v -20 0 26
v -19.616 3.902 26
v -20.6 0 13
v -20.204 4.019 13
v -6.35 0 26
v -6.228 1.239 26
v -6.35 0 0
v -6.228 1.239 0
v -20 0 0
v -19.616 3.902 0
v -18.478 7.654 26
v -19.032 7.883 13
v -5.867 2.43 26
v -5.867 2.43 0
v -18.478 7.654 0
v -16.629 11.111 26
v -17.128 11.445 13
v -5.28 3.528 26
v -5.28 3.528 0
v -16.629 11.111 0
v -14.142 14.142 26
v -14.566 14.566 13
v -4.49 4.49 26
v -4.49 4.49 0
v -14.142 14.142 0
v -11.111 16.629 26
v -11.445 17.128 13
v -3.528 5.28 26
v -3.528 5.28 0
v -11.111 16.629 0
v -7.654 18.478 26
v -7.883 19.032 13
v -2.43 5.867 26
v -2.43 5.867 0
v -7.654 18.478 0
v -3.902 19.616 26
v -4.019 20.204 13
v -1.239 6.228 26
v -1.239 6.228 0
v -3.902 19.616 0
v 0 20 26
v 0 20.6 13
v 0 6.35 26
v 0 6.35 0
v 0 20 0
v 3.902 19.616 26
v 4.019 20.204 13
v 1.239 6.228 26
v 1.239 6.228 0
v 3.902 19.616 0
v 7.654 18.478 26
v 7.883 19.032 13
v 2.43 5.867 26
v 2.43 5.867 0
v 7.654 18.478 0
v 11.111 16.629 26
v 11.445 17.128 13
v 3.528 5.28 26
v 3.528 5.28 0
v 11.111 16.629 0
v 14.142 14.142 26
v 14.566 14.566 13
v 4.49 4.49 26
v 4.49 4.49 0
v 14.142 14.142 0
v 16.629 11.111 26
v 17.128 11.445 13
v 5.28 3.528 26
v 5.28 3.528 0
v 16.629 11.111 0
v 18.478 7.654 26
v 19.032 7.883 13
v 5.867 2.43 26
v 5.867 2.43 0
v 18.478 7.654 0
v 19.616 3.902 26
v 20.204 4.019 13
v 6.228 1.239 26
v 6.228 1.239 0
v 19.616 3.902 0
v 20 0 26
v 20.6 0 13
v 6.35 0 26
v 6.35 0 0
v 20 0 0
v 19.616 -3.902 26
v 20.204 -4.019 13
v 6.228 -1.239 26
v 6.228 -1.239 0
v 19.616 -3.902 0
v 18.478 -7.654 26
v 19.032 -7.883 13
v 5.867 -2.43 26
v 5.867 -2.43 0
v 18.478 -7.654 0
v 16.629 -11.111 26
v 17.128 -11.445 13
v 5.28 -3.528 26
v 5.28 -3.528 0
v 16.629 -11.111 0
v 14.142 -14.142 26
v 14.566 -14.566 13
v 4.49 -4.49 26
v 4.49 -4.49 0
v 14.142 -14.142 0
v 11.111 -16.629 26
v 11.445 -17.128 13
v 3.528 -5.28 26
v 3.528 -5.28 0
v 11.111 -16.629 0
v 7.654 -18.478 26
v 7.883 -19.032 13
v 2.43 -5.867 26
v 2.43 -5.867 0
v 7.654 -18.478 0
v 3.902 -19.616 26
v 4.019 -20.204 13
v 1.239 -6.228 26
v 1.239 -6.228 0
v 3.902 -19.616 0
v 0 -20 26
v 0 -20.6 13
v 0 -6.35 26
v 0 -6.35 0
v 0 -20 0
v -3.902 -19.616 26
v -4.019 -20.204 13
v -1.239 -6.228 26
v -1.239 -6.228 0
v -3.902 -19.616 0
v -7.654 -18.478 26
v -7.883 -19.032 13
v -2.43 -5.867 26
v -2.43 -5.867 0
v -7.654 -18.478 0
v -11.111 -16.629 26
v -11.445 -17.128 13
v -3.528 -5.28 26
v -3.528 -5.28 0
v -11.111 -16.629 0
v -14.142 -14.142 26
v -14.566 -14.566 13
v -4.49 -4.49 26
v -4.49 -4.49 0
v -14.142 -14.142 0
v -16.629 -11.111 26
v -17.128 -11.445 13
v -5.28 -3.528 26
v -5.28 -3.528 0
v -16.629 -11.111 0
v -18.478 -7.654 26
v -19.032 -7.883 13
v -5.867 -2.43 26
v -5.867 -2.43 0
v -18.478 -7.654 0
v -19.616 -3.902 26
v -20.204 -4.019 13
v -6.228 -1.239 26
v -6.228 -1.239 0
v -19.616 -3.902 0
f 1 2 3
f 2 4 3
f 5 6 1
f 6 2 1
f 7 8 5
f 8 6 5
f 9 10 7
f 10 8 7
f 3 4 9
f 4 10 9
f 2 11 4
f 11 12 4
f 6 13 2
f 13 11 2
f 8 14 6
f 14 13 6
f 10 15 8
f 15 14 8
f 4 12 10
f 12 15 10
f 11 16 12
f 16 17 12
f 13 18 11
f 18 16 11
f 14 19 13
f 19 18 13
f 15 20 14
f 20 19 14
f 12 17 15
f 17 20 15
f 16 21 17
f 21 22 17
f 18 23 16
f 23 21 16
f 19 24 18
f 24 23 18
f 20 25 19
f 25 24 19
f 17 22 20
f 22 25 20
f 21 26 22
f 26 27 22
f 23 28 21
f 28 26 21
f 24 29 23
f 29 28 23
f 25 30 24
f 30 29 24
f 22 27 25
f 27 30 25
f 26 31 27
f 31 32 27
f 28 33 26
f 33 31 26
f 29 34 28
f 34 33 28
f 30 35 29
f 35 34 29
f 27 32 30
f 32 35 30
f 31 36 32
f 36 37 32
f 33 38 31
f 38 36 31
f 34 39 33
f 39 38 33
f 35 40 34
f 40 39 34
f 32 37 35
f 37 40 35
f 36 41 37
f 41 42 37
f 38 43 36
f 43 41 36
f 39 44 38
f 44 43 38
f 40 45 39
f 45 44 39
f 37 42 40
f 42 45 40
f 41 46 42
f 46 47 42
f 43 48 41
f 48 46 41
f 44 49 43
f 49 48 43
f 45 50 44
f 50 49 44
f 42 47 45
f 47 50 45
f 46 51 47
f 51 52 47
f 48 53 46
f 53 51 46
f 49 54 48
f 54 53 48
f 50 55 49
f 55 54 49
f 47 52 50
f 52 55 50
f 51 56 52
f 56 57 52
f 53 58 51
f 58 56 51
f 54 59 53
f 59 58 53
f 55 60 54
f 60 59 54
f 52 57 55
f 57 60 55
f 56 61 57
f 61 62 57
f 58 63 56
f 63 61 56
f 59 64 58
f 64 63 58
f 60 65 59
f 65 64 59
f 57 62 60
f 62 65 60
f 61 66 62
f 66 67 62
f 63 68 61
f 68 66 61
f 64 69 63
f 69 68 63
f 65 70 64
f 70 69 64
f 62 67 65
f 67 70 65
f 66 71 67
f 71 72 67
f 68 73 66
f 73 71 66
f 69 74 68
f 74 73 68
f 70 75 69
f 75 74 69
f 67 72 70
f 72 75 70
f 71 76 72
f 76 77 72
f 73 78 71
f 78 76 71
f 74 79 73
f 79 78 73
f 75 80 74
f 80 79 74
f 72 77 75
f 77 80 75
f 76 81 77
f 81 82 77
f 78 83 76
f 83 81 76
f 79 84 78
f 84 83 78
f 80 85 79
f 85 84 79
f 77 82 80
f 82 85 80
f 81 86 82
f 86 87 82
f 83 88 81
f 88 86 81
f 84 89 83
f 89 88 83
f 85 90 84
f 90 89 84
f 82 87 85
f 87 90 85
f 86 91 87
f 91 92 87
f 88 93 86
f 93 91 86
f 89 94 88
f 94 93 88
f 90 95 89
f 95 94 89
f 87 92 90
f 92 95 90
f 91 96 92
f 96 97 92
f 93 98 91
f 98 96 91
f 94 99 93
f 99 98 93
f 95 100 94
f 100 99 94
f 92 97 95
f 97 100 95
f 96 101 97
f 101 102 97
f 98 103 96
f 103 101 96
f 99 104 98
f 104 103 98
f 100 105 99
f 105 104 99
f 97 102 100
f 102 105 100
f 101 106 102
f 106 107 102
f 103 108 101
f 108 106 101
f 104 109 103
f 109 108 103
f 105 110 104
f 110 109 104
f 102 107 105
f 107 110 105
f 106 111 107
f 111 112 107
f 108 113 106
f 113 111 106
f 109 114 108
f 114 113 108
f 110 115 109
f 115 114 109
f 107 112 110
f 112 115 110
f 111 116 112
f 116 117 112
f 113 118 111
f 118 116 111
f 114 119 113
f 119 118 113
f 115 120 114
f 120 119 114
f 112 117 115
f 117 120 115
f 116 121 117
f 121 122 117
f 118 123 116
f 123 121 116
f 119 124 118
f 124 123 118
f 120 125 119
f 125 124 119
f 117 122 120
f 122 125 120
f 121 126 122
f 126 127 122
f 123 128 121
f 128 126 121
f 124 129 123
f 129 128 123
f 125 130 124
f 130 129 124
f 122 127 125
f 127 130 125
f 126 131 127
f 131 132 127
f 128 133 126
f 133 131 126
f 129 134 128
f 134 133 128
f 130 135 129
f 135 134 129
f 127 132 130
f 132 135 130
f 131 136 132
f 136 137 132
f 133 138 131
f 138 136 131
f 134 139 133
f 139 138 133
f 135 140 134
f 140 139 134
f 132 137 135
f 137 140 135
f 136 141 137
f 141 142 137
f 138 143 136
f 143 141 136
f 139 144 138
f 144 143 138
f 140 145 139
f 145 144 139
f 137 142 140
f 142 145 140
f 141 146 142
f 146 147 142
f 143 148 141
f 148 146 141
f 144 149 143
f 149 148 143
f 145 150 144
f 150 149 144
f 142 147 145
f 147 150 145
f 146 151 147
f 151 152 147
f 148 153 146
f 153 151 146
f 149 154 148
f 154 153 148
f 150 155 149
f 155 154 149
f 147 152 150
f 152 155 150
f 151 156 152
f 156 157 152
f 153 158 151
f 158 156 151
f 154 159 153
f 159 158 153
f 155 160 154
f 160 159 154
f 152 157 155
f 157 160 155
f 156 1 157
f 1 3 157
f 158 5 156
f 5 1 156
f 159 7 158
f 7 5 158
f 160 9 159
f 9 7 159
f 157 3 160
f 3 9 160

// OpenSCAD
$fn = 32;

// ----------------------------------------------------------------------
// Belt roller: 40 mm barrel, 26 mm wide, bore 12.7 mm
// ----------------------------------------------------------------------

// --- parameters (mm) ---
bore_d = 12.7;            // bore
barrel_d = 40;            // barrel diameter
roller_w = 26;            // roller width
crown = 0.6;              // crown height at mid width

roller_profile = [[6.35, 0], [20, 0], [20.6, 13], [20, 26], [6.35, 26]];

/* the profile stays clear of the axis, so the bore comes out of the revolve */
rotate_extrude() polygon(roller_profile);
